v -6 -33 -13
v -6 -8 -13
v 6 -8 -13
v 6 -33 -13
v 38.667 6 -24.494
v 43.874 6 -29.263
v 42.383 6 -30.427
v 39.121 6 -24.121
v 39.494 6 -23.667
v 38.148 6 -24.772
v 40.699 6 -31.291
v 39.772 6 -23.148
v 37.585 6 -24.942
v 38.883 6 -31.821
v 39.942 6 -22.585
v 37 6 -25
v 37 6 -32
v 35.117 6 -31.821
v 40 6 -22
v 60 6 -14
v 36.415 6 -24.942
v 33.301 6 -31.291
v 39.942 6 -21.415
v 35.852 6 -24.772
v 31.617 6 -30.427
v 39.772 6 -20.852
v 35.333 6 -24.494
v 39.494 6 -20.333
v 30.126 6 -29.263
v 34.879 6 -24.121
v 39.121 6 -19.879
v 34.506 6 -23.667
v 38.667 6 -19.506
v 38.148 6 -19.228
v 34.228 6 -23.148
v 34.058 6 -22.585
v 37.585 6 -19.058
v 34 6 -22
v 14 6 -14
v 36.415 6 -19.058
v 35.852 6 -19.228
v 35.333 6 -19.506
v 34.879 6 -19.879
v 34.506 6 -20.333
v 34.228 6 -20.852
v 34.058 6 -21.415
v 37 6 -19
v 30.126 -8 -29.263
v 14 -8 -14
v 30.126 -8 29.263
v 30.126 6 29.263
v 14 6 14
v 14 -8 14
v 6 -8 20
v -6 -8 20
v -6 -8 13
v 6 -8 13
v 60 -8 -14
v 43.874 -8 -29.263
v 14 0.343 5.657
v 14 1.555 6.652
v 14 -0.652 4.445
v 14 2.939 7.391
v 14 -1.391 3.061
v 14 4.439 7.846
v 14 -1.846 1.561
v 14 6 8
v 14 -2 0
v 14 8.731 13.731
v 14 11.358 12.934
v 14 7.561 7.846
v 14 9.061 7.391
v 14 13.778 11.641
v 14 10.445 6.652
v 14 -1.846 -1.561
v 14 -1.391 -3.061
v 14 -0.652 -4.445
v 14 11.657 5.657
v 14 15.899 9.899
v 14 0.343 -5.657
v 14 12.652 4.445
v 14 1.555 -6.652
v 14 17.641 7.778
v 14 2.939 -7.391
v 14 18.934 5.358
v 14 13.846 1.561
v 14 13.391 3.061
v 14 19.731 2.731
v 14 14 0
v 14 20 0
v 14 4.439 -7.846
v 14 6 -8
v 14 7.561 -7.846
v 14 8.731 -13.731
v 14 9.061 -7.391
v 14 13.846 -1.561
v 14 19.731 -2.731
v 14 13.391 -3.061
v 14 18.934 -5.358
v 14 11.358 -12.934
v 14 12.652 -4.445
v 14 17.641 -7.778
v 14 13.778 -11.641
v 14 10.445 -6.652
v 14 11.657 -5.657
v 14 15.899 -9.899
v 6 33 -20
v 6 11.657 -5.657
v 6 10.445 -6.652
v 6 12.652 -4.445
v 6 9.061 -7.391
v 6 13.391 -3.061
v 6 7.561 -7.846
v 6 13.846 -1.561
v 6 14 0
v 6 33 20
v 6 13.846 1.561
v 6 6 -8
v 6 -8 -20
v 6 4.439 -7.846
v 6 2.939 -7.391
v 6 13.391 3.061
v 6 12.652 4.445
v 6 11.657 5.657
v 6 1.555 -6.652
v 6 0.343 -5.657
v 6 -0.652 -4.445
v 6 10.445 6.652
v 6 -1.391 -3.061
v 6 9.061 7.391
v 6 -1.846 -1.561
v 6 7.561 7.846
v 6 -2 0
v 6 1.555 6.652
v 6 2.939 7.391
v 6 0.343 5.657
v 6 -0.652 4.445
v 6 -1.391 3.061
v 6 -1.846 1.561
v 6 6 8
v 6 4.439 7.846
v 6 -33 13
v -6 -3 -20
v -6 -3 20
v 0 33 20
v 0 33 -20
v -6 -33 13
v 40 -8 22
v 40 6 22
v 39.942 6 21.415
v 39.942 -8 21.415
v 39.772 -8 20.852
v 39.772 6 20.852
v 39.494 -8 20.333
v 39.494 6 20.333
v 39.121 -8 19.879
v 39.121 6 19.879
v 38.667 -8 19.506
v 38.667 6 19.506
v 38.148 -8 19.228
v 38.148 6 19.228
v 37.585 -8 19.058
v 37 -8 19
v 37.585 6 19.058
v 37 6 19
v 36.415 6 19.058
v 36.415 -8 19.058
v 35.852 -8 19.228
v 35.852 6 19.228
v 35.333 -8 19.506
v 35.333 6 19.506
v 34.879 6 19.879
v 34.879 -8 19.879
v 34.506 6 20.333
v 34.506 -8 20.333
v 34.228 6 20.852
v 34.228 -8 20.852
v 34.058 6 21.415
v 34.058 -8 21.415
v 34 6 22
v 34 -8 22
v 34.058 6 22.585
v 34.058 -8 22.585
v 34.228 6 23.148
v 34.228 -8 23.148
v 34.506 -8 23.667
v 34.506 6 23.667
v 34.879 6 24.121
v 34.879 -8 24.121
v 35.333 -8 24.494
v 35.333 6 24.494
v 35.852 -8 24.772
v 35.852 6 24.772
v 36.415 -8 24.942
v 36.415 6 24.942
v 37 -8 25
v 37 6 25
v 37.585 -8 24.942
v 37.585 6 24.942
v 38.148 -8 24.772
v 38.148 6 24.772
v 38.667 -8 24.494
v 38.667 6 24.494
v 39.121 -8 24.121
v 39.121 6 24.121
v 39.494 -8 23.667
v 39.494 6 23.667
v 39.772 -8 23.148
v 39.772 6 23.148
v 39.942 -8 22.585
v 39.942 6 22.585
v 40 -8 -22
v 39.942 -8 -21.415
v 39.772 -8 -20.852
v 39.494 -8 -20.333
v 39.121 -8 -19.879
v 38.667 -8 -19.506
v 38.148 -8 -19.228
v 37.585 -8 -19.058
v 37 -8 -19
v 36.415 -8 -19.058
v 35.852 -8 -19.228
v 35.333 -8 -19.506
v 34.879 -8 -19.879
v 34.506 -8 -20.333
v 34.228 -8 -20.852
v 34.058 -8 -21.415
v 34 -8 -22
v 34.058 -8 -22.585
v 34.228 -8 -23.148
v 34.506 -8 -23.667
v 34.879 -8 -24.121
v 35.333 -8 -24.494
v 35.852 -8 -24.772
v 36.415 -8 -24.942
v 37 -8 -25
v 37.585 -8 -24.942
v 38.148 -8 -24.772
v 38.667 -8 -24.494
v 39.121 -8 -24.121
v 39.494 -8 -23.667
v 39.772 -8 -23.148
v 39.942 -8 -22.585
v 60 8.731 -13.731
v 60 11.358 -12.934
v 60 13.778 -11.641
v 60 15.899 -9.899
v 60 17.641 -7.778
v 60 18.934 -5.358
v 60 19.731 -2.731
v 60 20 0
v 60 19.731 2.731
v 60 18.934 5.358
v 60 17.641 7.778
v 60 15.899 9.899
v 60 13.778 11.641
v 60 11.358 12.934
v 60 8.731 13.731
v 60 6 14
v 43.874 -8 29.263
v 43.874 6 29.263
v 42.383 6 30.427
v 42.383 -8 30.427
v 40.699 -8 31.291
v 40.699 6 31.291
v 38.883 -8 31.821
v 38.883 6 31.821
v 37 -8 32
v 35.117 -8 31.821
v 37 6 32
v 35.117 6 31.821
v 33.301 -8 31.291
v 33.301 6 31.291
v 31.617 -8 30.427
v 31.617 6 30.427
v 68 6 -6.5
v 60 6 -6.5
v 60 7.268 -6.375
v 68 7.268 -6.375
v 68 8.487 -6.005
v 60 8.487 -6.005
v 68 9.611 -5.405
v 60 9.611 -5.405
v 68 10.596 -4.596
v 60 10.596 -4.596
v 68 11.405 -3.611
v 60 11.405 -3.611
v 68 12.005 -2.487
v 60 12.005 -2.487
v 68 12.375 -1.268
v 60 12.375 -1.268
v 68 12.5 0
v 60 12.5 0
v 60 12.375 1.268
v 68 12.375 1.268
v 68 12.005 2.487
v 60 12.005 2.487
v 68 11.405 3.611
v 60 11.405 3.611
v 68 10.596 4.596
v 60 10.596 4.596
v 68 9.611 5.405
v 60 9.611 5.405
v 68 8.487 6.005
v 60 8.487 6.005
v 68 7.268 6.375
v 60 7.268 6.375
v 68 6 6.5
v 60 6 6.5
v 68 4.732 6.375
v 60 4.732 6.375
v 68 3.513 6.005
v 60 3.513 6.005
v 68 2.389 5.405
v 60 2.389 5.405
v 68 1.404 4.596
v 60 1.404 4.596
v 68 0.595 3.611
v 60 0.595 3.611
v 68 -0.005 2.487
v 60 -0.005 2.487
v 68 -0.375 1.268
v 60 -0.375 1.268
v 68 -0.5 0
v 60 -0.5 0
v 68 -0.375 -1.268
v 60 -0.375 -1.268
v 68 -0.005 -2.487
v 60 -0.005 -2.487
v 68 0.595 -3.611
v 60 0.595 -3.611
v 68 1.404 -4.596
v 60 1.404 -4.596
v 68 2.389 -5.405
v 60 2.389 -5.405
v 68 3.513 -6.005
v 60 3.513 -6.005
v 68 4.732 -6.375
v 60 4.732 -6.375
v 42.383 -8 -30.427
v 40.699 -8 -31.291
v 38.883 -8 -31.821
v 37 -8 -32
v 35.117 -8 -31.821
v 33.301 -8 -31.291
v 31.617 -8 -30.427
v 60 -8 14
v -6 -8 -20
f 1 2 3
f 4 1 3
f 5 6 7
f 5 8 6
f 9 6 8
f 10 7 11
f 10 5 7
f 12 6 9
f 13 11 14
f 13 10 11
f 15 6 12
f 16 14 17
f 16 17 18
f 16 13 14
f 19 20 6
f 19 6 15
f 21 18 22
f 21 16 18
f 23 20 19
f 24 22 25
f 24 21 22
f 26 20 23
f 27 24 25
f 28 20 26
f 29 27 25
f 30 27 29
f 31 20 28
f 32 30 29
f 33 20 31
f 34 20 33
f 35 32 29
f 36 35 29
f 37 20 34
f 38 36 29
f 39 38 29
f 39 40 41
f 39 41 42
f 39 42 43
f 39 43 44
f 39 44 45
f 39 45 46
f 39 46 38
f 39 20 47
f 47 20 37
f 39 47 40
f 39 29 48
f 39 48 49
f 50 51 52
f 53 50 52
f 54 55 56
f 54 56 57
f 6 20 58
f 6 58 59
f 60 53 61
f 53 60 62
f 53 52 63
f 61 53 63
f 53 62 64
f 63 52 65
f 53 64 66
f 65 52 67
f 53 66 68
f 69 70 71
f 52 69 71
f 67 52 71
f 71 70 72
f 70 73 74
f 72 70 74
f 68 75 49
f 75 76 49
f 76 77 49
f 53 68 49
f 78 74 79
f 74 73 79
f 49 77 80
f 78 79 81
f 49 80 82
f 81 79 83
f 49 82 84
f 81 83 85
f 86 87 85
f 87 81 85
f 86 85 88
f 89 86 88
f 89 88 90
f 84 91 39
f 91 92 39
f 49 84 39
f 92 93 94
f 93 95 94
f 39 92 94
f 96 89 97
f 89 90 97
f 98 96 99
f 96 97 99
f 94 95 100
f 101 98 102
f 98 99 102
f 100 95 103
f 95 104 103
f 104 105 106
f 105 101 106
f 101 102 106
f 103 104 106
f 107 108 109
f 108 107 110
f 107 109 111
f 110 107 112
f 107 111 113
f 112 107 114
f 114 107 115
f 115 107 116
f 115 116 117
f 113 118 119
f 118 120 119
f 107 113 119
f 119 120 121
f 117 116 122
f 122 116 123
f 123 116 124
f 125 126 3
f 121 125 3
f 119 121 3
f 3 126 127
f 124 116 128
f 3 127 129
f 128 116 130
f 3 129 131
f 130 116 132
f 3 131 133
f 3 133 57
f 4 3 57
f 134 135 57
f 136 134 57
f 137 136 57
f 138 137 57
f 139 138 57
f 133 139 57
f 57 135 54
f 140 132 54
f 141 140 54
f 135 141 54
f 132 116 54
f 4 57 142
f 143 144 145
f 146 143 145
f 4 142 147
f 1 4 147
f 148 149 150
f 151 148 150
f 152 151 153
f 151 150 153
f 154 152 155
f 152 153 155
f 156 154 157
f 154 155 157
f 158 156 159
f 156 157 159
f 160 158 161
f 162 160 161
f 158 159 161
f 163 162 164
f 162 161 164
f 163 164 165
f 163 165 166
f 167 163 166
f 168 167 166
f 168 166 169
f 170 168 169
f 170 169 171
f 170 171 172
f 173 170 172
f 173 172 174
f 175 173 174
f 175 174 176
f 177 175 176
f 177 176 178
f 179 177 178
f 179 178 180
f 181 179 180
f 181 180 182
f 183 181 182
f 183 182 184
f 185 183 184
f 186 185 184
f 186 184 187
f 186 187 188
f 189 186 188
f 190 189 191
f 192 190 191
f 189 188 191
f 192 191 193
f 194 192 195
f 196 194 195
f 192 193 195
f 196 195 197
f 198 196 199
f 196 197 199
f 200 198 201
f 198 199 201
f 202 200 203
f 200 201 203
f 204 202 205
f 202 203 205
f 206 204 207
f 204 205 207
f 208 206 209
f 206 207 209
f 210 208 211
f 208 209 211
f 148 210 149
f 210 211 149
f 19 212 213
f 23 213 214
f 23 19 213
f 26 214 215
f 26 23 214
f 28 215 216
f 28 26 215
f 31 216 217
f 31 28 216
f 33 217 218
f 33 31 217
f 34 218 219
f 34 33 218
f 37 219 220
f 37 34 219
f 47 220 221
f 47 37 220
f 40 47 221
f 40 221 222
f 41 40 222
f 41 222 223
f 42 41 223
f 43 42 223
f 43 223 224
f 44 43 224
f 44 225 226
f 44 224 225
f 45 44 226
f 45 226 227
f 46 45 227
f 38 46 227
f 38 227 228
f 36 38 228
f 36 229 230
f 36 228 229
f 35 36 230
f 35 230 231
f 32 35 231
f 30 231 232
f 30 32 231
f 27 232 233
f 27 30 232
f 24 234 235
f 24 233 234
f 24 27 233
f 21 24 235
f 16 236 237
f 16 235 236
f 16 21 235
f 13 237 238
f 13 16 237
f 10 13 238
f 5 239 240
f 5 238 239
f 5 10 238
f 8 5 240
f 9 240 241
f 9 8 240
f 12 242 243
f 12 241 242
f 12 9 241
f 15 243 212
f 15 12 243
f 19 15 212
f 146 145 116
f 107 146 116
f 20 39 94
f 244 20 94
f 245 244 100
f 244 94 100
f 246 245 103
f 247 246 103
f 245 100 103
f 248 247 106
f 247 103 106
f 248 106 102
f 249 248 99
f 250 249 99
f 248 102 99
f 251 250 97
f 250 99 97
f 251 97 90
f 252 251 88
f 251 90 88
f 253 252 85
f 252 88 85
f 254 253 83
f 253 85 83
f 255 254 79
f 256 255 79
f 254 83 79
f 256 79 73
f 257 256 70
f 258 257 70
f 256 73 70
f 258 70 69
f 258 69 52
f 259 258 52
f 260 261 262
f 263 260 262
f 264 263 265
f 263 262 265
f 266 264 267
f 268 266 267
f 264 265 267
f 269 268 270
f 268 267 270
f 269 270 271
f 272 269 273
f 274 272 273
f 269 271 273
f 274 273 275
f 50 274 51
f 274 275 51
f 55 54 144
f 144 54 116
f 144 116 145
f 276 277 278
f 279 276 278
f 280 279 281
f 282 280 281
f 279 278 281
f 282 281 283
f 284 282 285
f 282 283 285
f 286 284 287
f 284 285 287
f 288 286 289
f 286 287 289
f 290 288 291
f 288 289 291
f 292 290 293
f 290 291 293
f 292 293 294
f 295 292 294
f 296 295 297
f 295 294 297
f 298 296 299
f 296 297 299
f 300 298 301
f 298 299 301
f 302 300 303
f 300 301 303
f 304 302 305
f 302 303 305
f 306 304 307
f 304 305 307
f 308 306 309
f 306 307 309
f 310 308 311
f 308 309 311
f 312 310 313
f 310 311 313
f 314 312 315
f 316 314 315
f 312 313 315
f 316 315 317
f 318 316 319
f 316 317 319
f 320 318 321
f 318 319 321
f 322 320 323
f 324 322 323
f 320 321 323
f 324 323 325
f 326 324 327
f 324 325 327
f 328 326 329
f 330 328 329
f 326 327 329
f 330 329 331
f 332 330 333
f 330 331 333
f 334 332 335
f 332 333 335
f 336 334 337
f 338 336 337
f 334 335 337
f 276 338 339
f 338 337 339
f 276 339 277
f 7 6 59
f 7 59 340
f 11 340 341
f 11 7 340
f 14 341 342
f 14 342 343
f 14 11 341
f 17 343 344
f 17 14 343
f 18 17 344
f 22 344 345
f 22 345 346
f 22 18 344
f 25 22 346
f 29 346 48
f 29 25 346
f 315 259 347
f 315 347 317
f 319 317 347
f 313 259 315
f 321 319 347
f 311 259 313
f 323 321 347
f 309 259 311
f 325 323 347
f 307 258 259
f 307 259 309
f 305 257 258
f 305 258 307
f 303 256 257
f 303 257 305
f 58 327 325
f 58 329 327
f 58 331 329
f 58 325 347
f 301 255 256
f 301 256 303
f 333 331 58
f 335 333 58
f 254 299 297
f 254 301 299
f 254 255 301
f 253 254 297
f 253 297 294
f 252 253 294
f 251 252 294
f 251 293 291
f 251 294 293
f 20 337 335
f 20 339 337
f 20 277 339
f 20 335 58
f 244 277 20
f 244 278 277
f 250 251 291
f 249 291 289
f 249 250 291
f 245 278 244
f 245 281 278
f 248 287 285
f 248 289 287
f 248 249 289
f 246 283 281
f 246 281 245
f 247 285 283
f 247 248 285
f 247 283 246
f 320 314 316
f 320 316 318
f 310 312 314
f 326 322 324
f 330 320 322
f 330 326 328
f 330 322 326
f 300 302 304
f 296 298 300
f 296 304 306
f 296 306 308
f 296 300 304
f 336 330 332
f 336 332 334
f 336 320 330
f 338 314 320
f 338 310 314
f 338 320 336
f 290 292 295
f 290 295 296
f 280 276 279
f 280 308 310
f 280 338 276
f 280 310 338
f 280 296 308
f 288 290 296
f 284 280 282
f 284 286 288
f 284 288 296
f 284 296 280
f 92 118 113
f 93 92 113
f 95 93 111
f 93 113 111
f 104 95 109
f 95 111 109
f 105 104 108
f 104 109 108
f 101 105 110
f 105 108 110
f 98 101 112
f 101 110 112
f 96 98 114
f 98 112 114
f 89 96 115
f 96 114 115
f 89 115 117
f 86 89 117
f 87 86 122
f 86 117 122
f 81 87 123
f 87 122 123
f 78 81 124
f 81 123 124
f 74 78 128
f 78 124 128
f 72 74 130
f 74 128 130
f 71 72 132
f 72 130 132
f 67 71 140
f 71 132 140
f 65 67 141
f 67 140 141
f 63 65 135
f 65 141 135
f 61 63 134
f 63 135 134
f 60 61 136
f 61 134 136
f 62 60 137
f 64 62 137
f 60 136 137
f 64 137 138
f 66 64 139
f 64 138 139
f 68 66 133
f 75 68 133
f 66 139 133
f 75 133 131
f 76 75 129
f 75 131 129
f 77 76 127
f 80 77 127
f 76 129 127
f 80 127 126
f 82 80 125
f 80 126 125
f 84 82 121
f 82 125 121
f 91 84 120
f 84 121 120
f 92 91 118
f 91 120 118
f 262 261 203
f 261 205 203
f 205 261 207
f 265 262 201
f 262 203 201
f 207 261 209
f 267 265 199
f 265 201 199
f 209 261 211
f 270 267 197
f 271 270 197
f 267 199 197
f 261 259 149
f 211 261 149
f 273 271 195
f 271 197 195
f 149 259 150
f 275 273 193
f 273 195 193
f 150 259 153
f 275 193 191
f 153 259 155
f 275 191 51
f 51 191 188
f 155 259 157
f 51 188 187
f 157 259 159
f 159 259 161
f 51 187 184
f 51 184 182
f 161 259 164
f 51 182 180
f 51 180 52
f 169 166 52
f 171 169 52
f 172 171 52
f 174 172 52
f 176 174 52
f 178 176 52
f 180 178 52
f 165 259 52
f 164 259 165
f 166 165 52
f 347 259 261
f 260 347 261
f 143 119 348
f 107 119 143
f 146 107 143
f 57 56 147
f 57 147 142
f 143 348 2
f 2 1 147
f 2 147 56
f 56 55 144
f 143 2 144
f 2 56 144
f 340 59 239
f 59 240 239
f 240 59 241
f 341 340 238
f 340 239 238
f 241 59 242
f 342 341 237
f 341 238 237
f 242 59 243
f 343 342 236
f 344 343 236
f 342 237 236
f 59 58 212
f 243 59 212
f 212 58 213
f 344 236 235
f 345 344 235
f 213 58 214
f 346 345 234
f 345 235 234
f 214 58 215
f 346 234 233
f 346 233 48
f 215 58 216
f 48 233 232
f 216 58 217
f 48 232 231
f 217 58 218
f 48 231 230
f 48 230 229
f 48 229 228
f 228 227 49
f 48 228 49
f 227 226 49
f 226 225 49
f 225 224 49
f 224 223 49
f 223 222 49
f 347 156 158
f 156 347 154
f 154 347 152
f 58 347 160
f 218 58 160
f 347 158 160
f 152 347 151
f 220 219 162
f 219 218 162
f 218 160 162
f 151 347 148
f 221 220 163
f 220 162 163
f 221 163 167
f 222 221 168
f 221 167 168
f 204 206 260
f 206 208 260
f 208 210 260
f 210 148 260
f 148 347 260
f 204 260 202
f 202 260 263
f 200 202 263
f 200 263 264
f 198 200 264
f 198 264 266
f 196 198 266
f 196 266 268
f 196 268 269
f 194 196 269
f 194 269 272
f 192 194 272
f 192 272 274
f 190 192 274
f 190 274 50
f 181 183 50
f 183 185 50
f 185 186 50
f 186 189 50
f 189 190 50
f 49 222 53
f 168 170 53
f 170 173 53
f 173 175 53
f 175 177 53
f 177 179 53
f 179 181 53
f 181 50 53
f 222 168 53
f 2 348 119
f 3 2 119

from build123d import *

# Parameters (mm, degrees)
ESTRUSIONE_ESTRUSIONE1_DEPTH = 20
SCHIZZO2_W                   = 12
SCHIZZO2_H                   = 25
TAGLIO_ESTRUSIONE1_DEPTH     = 7
SCHIZZO3_R                   = 8
ESTRUSIONE_ESTRUSIONE2_DEPTH = 8
ESTRUSIONE_ESTRUSIONE3_DEPTH = 46
ESTRUSIONE_ESTRUSIONE5_DEPTH = 14
SCHIZZO6_R                   = 6.5
ESTRUSIONE_ESTRUSIONE6_DEPTH = 8
SCHIZZO7_R                   = 3
TAGLIO_ESTRUSIONE2_DEPTH     = 40


with BuildPart() as part:
    # Schizzo1 → Estrusione-Estrusione1 (new body, symmetric)
    with BuildSketch(Plane.XY):
        Polygon((0, 33), (6, 33), (6, -33), (-6, -33), (-6, -3), align=None)
    extrude(amount=ESTRUSIONE_ESTRUSIONE1_DEPTH, both=True)

    # Schizzo2 → Taglio-Estrusione1 (cut)
    with BuildSketch(Plane.XY.offset(20)):
        with Locations((0, -20.5)):
            Rectangle(SCHIZZO2_W, SCHIZZO2_H)
    taglio_estrusione1 = extrude(amount=-TAGLIO_ESTRUSIONE1_DEPTH, mode=Mode.SUBTRACT)

    # Specchia1: Taglio-Estrusione1 across plane
    add(taglio_estrusione1.mirror(Plane.XY), mode=Mode.SUBTRACT)

    # Schizzo3 → Estrusione-Estrusione2 (add)
    with BuildSketch(Plane(origin=(6, 0, 0), x_dir=(0, 0, -1), z_dir=(1, 0, 0))):
        with Locations((0, 6)):
            Circle(SCHIZZO3_R)
    extrude(amount=ESTRUSIONE_ESTRUSIONE2_DEPTH)

    # Schizzo4 → Estrusione-Estrusione3 (add)
    with BuildSketch(Plane(origin=(14, 0, 0), x_dir=(0, 0, -1), z_dir=(1, 0, 0))):
        with BuildLine():
            Line((-14, 6), (-14, -8))
            Line((-14, -8), (14, -8))
            Line((14, -8), (14, 6))
            ThreePointArc((14, 6), (0, 20), (-14, 6))
        make_face()
    extrude(amount=ESTRUSIONE_ESTRUSIONE3_DEPTH)

    # Schizzo5 → Estrusione-Estrusione5 (add)
    with BuildSketch(Plane(origin=(0, 6, 0), x_dir=(1, 0, 0), z_dir=(0, 1, 0))):
        with BuildLine():
            Line((14, -14), (60, -14))
            Line((60, -14), (43.874010565, -29.262780374))
            ThreePointArc((43.874010565, -29.262780374), (37, -32), (30.125989435, -29.262780374))
            Line((30.125989435, -29.262780374), (14, -14))
        make_face()
    estrusione_estrusione5 = extrude(amount=-ESTRUSIONE_ESTRUSIONE5_DEPTH)

    # Specchia2: Estrusione-Estrusione5 across plane
    add(estrusione_estrusione5.mirror(Plane.XY))

    # Schizzo6 → Estrusione-Estrusione6 (add)
    with BuildSketch(Plane(origin=(60, 0, 0), x_dir=(0, 0, -1), z_dir=(1, 0, 0))):
        with Locations((0, 6)):
            Circle(SCHIZZO6_R)
    extrude(amount=ESTRUSIONE_ESTRUSIONE6_DEPTH)

    # Schizzo7 → Taglio-Estrusione2 (cut, through all)
    with BuildSketch(Plane(origin=(0, 6, 0), x_dir=(1, 0, 0), z_dir=(0, 1, 0))):
        with Locations((37, -22)):
            Circle(SCHIZZO7_R)
    taglio_estrusione2 = extrude(amount=-TAGLIO_ESTRUSIONE2_DEPTH, mode=Mode.SUBTRACT)

    # Specchia3: Taglio-Estrusione2 across plane
    add(taglio_estrusione2.mirror(Plane.XY), mode=Mode.SUBTRACT)


solid = part.part
